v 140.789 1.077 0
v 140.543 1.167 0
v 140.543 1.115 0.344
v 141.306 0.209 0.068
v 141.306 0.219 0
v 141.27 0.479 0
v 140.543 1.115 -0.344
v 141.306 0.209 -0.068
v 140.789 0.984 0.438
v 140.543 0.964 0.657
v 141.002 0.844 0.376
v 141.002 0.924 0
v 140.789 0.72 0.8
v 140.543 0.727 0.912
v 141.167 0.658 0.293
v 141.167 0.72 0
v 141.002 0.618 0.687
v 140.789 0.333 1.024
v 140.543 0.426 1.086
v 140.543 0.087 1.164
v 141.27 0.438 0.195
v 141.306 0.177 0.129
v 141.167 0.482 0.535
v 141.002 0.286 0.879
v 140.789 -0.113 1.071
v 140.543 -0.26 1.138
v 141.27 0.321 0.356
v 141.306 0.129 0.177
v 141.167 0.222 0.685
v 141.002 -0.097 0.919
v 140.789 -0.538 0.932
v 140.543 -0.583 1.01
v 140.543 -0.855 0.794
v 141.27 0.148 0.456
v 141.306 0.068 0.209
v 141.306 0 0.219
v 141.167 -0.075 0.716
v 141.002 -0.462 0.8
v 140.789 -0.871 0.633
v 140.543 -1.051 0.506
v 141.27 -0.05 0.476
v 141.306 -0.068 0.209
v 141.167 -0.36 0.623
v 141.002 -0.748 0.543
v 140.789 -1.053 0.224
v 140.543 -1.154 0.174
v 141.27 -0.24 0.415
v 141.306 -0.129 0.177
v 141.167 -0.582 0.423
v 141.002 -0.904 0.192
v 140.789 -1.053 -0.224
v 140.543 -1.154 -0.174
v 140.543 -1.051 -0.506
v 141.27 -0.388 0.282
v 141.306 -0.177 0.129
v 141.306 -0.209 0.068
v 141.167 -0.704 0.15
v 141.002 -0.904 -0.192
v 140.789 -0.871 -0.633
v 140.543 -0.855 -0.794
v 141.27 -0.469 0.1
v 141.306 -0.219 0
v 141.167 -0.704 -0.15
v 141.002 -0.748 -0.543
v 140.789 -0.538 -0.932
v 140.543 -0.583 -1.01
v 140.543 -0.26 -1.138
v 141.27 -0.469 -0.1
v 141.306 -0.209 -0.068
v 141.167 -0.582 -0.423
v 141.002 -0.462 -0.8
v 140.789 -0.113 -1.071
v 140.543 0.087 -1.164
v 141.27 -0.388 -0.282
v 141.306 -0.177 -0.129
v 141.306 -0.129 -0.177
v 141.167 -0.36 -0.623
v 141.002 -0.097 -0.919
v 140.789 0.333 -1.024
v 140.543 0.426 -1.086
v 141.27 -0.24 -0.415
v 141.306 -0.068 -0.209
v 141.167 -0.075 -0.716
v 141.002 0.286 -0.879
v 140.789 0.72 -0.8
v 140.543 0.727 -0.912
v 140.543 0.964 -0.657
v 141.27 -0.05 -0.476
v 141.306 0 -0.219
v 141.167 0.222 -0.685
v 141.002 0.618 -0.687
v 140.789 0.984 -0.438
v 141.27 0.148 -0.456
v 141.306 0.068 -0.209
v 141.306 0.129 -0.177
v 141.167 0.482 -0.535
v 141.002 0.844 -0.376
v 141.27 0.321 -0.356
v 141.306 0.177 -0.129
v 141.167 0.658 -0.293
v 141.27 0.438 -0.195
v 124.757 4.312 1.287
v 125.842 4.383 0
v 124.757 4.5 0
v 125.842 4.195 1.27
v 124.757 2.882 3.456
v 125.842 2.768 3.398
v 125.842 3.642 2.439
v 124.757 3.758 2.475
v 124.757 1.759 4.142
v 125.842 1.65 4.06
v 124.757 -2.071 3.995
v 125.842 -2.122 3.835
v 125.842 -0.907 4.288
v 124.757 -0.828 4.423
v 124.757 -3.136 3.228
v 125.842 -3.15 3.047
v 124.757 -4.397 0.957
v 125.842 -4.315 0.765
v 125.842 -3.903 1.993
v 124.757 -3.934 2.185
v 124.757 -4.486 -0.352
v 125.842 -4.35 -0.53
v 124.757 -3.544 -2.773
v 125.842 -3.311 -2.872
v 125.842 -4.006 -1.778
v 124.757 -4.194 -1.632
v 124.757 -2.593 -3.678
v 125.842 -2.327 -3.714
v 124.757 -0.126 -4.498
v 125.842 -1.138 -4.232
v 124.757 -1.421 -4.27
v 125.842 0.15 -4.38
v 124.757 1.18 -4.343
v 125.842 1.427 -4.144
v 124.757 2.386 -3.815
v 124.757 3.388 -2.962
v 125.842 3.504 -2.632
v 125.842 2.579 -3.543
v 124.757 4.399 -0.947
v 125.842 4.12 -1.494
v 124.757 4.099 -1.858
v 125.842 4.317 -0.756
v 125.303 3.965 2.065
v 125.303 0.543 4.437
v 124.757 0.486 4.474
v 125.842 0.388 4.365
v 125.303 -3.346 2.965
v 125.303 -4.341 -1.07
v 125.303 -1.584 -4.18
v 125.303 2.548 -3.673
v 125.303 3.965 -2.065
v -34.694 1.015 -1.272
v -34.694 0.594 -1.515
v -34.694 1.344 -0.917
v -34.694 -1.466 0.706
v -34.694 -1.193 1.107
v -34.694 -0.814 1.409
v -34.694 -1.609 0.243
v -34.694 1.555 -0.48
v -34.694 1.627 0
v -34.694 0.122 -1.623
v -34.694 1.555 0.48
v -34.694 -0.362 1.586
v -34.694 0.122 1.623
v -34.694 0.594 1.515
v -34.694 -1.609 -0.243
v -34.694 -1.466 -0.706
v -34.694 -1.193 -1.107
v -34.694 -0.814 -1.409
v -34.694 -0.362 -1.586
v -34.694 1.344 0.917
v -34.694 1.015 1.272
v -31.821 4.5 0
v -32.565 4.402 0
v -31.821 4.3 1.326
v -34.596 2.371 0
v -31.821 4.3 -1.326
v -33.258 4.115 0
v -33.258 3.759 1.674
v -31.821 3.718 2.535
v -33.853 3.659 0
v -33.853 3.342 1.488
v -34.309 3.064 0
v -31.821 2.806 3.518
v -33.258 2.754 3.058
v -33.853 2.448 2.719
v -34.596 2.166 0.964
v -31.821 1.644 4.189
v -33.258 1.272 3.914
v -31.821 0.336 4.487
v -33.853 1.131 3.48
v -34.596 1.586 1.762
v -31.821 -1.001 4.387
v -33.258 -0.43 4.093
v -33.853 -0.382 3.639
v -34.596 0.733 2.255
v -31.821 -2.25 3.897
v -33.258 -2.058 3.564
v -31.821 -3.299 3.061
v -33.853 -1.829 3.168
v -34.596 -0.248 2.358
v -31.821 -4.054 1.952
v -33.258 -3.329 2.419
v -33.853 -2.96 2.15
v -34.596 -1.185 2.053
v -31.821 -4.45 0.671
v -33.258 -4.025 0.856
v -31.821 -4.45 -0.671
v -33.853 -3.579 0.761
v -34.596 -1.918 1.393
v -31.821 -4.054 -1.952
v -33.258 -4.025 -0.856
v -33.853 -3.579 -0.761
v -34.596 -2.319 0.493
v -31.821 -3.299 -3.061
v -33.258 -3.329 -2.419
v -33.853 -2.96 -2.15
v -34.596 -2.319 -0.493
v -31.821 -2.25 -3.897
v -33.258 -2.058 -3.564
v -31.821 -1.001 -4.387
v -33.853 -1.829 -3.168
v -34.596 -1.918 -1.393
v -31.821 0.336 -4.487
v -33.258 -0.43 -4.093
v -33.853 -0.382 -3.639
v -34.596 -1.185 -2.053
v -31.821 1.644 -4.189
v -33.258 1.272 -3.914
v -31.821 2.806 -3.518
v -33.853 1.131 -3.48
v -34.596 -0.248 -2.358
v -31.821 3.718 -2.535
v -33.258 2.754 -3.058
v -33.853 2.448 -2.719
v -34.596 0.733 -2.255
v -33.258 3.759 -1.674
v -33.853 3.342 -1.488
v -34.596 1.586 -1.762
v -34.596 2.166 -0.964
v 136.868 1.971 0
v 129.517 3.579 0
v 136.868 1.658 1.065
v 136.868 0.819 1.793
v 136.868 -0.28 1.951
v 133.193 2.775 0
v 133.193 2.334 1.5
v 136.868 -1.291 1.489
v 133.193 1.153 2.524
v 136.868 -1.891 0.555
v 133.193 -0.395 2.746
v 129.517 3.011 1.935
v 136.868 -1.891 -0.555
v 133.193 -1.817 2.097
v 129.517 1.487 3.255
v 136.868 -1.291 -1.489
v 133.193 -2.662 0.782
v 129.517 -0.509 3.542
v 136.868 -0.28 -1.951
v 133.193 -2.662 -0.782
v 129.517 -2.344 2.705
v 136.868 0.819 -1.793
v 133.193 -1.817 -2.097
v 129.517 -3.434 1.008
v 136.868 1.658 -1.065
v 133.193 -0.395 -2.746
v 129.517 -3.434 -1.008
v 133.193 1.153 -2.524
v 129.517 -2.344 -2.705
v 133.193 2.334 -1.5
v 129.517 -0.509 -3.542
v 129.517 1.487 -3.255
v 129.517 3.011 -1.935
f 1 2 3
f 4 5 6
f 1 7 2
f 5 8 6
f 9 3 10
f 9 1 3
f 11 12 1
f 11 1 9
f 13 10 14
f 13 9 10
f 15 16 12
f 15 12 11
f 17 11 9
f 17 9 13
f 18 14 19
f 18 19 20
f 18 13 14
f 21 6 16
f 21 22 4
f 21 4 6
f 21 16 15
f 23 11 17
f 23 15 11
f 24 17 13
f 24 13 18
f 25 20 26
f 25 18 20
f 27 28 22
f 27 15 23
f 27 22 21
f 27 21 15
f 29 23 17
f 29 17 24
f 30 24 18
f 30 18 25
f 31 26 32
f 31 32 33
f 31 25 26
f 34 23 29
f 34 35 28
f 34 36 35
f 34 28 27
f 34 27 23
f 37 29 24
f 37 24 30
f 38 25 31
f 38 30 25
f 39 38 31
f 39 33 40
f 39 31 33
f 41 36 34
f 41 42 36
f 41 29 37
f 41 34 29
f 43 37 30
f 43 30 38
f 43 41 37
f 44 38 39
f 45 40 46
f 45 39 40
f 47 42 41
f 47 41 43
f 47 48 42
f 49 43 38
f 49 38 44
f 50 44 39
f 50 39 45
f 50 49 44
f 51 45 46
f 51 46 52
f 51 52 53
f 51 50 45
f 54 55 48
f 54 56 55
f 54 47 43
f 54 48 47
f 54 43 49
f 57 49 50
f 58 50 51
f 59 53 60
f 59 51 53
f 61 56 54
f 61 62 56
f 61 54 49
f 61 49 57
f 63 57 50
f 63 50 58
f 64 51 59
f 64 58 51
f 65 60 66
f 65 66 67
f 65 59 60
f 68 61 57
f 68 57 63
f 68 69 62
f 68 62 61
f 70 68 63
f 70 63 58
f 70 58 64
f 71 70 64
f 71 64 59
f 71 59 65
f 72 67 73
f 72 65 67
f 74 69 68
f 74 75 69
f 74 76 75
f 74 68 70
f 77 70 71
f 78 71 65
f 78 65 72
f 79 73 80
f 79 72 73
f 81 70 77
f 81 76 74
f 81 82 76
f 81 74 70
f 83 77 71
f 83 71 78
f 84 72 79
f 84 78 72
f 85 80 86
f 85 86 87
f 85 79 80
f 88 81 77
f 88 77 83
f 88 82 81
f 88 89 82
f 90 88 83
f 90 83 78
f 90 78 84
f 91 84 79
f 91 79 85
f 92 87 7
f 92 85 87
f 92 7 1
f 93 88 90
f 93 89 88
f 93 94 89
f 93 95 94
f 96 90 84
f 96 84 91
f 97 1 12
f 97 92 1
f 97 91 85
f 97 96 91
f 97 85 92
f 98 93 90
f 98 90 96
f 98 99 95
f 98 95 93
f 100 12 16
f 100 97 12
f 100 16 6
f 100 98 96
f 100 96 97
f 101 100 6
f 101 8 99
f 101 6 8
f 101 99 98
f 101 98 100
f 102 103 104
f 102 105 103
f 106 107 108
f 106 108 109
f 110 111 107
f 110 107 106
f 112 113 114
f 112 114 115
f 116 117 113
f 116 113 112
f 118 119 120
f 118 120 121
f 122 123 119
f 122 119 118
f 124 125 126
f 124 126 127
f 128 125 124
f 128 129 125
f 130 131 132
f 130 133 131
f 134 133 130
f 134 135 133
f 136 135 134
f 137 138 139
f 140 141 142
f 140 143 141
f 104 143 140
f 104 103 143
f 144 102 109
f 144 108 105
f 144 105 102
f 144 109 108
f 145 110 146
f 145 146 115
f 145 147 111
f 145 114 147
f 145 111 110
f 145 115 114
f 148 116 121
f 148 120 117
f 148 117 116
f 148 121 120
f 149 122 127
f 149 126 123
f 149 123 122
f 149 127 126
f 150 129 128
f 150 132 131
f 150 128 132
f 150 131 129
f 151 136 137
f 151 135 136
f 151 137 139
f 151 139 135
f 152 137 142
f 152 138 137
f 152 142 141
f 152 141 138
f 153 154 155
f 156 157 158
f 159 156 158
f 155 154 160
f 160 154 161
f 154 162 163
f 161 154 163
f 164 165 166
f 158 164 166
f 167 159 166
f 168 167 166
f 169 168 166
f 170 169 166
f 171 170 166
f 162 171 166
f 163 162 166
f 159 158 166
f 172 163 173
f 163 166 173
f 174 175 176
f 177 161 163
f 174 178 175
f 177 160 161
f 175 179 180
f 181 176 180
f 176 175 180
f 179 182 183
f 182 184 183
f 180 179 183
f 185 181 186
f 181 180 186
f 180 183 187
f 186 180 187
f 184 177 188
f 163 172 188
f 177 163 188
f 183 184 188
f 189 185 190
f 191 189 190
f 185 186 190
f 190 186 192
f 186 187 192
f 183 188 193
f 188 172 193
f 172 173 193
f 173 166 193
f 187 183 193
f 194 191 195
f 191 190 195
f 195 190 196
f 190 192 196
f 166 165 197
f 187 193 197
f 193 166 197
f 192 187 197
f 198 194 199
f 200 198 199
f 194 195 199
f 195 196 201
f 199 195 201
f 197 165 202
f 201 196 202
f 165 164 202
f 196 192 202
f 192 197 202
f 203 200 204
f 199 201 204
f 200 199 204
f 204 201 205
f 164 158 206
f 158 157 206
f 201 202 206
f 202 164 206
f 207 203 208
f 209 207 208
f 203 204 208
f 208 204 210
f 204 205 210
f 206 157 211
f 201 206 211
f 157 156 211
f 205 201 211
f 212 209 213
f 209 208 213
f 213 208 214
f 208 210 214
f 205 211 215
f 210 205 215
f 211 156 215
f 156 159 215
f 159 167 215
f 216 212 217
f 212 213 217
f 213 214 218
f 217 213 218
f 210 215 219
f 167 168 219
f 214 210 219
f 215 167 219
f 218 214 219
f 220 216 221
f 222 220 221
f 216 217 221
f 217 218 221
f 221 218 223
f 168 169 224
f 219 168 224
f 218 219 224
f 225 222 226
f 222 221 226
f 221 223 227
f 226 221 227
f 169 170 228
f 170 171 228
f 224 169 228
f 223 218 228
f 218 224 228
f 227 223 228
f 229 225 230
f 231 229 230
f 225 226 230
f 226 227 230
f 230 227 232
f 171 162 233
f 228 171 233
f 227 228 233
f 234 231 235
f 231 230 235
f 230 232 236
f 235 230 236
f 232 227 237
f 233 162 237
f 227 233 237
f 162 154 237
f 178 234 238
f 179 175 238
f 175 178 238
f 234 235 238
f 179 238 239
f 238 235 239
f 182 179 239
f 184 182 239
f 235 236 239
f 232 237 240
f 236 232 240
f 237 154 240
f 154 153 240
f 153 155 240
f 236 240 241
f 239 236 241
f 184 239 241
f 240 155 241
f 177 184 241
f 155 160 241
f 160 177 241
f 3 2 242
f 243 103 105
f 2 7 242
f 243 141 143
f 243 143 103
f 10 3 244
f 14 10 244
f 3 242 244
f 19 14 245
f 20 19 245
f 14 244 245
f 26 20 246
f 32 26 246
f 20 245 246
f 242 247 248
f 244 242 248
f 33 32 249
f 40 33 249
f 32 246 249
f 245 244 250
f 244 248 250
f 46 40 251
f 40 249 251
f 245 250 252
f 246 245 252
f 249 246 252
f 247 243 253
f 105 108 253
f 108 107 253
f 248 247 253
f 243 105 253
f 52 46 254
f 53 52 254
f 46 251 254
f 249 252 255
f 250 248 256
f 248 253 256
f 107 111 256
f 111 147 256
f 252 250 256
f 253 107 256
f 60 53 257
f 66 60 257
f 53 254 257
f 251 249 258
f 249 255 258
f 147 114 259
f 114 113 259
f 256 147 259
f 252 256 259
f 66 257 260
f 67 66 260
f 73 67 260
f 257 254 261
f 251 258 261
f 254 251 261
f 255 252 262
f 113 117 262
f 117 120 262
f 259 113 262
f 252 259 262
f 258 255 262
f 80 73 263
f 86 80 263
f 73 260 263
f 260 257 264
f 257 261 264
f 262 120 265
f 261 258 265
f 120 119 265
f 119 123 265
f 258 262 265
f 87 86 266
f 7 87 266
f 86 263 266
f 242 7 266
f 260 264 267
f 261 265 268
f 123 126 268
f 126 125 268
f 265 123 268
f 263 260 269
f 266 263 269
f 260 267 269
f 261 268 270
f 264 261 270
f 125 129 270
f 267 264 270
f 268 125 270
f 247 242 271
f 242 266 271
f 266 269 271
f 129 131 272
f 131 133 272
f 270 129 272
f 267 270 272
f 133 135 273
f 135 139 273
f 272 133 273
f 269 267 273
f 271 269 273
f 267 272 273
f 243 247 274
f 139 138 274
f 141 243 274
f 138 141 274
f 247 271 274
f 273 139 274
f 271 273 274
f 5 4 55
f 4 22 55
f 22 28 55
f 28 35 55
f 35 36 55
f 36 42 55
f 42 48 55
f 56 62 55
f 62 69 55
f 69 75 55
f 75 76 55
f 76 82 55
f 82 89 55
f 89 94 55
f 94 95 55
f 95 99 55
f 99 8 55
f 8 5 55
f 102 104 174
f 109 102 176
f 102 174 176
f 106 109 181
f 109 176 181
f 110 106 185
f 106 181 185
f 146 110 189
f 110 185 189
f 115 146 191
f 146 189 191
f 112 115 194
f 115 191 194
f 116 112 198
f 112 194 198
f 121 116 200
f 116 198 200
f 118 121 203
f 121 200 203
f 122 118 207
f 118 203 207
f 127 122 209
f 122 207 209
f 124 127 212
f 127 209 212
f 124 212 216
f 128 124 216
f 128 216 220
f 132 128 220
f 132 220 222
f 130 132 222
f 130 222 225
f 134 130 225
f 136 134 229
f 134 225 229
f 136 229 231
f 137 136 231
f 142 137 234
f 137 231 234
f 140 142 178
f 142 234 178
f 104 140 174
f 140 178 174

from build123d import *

# Parameters (mm, degrees)
F2_R = 2.872773
F3_R = 0.969826
F4_R = 5.08


with BuildPart() as f1:
    # F0 (on Top) → F1 (revolve)
    with BuildSketch(Plane.XY):
        Polygon((125.30574, 4.5), (-34.69426, 4.5), (-34.69426, 0), (141.30574, 0), (141.30574, 1), align=None)
    revolve(axis=Axis((0.009605, 0, 0), (1, 0, 0)))

    # F2
    f2_edges = [f1.edges().sort_by_distance(p)[0] for p in [
        (-34.69426, -4.5, 0),
    ]]
    fillet(f2_edges, radius=F2_R)

    # F3
    f3_edges = [f1.edges().sort_by_distance(p)[0] for p in [
        (141.30574, -1, 0),
    ]]
    fillet(f3_edges, radius=F3_R)

    # F4
    f4_edges = [f1.edges().sort_by_distance(p)[0] for p in [
        (125.30574, -4.5, 0),
    ]]
    fillet(f4_edges, radius=F4_R)


solid = f1.part
